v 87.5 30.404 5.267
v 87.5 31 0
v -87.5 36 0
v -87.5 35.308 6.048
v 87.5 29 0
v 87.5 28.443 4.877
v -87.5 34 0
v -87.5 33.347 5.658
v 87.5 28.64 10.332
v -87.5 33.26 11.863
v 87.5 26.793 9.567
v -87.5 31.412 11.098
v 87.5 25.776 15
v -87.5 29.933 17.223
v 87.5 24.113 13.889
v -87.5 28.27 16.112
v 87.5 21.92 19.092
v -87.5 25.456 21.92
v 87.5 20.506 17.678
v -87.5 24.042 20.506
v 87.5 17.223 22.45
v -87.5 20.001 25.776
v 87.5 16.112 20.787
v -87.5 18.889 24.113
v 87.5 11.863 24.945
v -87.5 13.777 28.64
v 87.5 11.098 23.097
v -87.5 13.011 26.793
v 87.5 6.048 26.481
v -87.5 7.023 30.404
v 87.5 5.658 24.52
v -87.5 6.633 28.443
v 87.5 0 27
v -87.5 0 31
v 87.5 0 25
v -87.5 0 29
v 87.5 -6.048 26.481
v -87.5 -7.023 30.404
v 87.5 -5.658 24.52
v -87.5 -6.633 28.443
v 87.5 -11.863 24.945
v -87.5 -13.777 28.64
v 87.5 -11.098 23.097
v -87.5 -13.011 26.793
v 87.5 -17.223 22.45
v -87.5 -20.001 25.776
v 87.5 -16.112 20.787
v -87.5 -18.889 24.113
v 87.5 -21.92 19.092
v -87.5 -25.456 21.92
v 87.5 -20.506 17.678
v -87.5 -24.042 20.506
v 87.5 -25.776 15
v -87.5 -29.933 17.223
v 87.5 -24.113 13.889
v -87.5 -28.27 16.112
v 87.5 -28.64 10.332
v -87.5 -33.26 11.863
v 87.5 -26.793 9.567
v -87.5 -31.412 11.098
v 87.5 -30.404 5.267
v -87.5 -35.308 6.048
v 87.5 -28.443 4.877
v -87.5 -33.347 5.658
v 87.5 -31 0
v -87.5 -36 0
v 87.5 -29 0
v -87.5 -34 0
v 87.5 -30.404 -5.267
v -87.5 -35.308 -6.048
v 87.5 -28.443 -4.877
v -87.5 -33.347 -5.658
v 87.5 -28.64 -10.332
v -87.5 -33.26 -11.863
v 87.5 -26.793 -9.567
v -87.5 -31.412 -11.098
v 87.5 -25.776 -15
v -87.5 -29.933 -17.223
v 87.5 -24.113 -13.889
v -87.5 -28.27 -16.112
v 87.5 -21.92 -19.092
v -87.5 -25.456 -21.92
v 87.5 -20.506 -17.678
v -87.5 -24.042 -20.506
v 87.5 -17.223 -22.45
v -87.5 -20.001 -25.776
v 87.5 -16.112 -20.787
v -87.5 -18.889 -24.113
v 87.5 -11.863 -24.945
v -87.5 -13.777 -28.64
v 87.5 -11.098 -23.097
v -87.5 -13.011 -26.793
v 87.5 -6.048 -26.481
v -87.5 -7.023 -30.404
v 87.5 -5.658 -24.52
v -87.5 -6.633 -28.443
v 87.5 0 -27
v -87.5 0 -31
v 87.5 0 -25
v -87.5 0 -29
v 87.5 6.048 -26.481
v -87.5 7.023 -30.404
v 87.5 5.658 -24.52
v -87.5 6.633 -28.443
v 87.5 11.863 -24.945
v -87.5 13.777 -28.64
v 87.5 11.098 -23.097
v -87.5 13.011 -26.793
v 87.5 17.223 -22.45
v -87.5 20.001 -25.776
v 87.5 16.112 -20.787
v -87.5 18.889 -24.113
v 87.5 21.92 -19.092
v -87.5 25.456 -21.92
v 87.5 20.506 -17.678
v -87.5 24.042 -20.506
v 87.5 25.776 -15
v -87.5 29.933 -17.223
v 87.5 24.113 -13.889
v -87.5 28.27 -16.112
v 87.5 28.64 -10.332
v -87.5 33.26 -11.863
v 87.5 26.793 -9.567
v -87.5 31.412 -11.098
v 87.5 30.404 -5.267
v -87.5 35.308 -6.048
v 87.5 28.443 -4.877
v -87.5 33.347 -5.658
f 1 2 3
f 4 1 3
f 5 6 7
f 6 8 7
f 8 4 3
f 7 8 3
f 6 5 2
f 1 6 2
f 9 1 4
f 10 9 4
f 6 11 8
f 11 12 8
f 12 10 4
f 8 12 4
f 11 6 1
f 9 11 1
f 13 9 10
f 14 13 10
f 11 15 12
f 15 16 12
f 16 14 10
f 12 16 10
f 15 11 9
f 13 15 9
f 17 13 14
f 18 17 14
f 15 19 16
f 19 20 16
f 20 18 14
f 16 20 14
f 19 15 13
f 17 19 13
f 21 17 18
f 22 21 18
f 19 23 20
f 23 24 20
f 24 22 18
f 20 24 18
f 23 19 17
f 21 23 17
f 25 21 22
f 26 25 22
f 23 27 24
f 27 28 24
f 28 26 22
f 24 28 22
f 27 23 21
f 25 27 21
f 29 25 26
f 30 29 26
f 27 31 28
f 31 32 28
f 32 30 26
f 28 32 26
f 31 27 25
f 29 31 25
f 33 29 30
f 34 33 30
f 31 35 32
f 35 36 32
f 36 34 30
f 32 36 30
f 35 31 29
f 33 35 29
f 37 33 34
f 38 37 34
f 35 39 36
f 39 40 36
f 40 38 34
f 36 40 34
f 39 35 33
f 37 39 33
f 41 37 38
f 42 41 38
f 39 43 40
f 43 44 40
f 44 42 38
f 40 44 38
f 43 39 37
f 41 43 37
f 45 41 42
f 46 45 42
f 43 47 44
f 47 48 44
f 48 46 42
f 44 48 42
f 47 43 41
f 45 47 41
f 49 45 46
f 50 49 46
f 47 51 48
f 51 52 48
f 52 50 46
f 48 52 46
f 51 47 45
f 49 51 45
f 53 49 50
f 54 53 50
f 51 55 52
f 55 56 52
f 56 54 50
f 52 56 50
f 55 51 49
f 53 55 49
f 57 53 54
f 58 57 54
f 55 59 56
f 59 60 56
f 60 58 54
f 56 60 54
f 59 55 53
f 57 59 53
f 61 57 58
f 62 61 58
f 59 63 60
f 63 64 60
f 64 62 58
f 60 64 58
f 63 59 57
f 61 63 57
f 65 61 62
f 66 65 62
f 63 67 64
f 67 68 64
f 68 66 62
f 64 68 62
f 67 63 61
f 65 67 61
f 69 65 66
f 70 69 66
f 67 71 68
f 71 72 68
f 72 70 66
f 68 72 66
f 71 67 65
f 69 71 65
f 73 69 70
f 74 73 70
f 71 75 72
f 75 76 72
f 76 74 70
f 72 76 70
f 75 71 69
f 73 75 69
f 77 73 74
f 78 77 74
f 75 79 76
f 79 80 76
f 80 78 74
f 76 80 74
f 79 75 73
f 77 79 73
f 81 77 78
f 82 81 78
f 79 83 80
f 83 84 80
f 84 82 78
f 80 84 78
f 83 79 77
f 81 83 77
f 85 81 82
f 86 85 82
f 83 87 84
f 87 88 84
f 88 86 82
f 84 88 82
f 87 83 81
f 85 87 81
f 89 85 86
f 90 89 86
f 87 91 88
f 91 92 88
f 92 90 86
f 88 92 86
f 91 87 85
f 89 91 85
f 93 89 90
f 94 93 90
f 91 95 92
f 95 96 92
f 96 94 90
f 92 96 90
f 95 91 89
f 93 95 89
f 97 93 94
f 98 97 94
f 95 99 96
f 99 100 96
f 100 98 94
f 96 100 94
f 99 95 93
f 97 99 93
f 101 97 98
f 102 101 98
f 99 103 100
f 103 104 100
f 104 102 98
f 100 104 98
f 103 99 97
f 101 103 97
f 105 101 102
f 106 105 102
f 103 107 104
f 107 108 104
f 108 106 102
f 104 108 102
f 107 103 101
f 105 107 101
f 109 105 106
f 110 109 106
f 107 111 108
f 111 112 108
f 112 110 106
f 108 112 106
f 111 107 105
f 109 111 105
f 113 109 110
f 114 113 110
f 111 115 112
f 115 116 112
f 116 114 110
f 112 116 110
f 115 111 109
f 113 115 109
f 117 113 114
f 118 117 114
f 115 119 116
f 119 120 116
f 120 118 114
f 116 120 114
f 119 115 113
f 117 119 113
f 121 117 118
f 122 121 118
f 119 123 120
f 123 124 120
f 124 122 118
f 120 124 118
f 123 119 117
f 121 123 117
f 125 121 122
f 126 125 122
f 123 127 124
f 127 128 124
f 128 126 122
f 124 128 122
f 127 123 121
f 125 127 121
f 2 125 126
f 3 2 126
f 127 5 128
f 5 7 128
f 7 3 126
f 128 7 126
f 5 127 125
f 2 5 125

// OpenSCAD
polyhedron(points=[[-87.5, 36.0, 0.0], [-87.5, 35.30827, 6.0478], [-87.5, 33.259663, 11.863186], [-87.5, 29.932906, 17.222677], [-87.5, 25.455844, 21.92031], [-87.5, 20.000528, 25.775558], [-87.5, 13.776604, 28.640266], [-87.5, 7.023252, 30.404344], [-87.5, 0.0, 31.0], [-87.5, -7.023252, 30.404344], [-87.5, -13.776604, 28.640266], [-87.5, -20.000528, 25.775558], [-87.5, -25.455844, 21.92031], [-87.5, -29.932906, 17.222677], [-87.5, -33.259663, 11.863186], [-87.5, -35.30827, 6.0478], [-87.5, -36.0, 0.0], [-87.5, -35.30827, -6.0478], [-87.5, -33.259663, -11.863186], [-87.5, -29.932906, -17.222677], [-87.5, -25.455844, -21.92031], [-87.5, -20.000528, -25.775558], [-87.5, -13.776604, -28.640266], [-87.5, -7.023252, -30.404344], [-87.5, -0.0, -31.0], [-87.5, 7.023252, -30.404344], [-87.5, 13.776604, -28.640266], [-87.5, 20.000528, -25.775558], [-87.5, 25.455844, -21.92031], [-87.5, 29.932906, -17.222677], [-87.5, 33.259663, -11.863186], [-87.5, 35.30827, -6.0478], [-87.5, 34.0, 0.0], [-87.5, 33.3467, 5.657619], [-87.5, 31.411904, 11.09782], [-87.5, 28.269967, 16.111537], [-87.5, 24.041631, 20.506097], [-87.5, 18.889388, 24.112619], [-87.5, 13.011237, 26.792506], [-87.5, 6.633071, 28.442773], [-87.5, 0.0, 29.0], [-87.5, -6.633071, 28.442773], [-87.5, -13.011237, 26.792506], [-87.5, -18.889388, 24.112619], [-87.5, -24.041631, 20.506097], [-87.5, -28.269967, 16.111537], [-87.5, -31.411904, 11.09782], [-87.5, -33.3467, 5.657619], [-87.5, -34.0, 0.0], [-87.5, -33.3467, -5.657619], [-87.5, -31.411904, -11.09782], [-87.5, -28.269967, -16.111537], [-87.5, -24.041631, -20.506097], [-87.5, -18.889388, -24.112619], [-87.5, -13.011237, -26.792506], [-87.5, -6.633071, -28.442773], [-87.5, -0.0, -29.0], [-87.5, 6.633071, -28.442773], [-87.5, 13.011237, -26.792506], [-87.5, 18.889388, -24.112619], [-87.5, 24.041631, -20.506097], [-87.5, 28.269967, -16.111537], [-87.5, 31.411904, -11.09782], [-87.5, 33.3467, -5.657619], [87.5, 31.0, 0.0], [87.5, 30.404344, 5.267439], [87.5, 28.640266, 10.332453], [87.5, 25.775558, 15.000396], [87.5, 21.92031, 19.091883], [87.5, 17.222677, 22.44968], [87.5, 11.863186, 24.944747], [87.5, 6.0478, 26.481203], [87.5, 0.0, 27.0], [87.5, -6.0478, 26.481203], [87.5, -11.863186, 24.944747], [87.5, -17.222677, 22.44968], [87.5, -21.92031, 19.091883], [87.5, -25.775558, 15.000396], [87.5, -28.640266, 10.332453], [87.5, -30.404344, 5.267439], [87.5, -31.0, 0.0], [87.5, -30.404344, -5.267439], [87.5, -28.640266, -10.332453], [87.5, -25.775558, -15.000396], [87.5, -21.92031, -19.091883], [87.5, -17.222677, -22.44968], [87.5, -11.863186, -24.944747], [87.5, -6.0478, -26.481203], [87.5, -0.0, -27.0], [87.5, 6.0478, -26.481203], [87.5, 11.863186, -24.944747], [87.5, 17.222677, -22.44968], [87.5, 21.92031, -19.091883], [87.5, 25.775558, -15.000396], [87.5, 28.640266, -10.332453], [87.5, 30.404344, -5.267439], [87.5, 29.0, 0.0], [87.5, 28.442773, 4.877258], [87.5, 26.792506, 9.567086], [87.5, 24.112619, 13.889256], [87.5, 20.506097, 17.67767], [87.5, 16.111537, 20.78674], [87.5, 11.09782, 23.096988], [87.5, 5.657619, 24.519632], [87.5, 0.0, 25.0], [87.5, -5.657619, 24.519632], [87.5, -11.09782, 23.096988], [87.5, -16.111537, 20.78674], [87.5, -20.506097, 17.67767], [87.5, -24.112619, 13.889256], [87.5, -26.792506, 9.567086], [87.5, -28.442773, 4.877258], [87.5, -29.0, 0.0], [87.5, -28.442773, -4.877258], [87.5, -26.792506, -9.567086], [87.5, -24.112619, -13.889256], [87.5, -20.506097, -17.67767], [87.5, -16.111537, -20.78674], [87.5, -11.09782, -23.096988], [87.5, -5.657619, -24.519632], [87.5, -0.0, -25.0], [87.5, 5.657619, -24.519632], [87.5, 11.09782, -23.096988], [87.5, 16.111537, -20.78674], [87.5, 20.506097, -17.67767], [87.5, 24.112619, -13.889256], [87.5, 26.792506, -9.567086], [87.5, 28.442773, -4.877258]], faces=[[0, 64, 65], [0, 65, 1], [32, 97, 96], [32, 33, 97], [0, 1, 33], [0, 33, 32], [64, 96, 97], [64, 97, 65], [1, 65, 66], [1, 66, 2], [33, 98, 97], [33, 34, 98], [1, 2, 34], [1, 34, 33], [65, 97, 98], [65, 98, 66], [2, 66, 67], [2, 67, 3], [34, 99, 98], [34, 35, 99], [2, 3, 35], [2, 35, 34], [66, 98, 99], [66, 99, 67], [3, 67, 68], [3, 68, 4], [35, 100, 99], [35, 36, 100], [3, 4, 36], [3, 36, 35], [67, 99, 100], [67, 100, 68], [4, 68, 69], [4, 69, 5], [36, 101, 100], [36, 37, 101], [4, 5, 37], [4, 37, 36], [68, 100, 101], [68, 101, 69], [5, 69, 70], [5, 70, 6], [37, 102, 101], [37, 38, 102], [5, 6, 38], [5, 38, 37], [69, 101, 102], [69, 102, 70], [6, 70, 71], [6, 71, 7], [38, 103, 102], [38, 39, 103], [6, 7, 39], [6, 39, 38], [70, 102, 103], [70, 103, 71], [7, 71, 72], [7, 72, 8], [39, 104, 103], [39, 40, 104], [7, 8, 40], [7, 40, 39], [71, 103, 104], [71, 104, 72], [8, 72, 73], [8, 73, 9], [40, 105, 104], [40, 41, 105], [8, 9, 41], [8, 41, 40], [72, 104, 105], [72, 105, 73], [9, 73, 74], [9, 74, 10], [41, 106, 105], [41, 42, 106], [9, 10, 42], [9, 42, 41], [73, 105, 106], [73, 106, 74], [10, 74, 75], [10, 75, 11], [42, 107, 106], [42, 43, 107], [10, 11, 43], [10, 43, 42], [74, 106, 107], [74, 107, 75], [11, 75, 76], [11, 76, 12], [43, 108, 107], [43, 44, 108], [11, 12, 44], [11, 44, 43], [75, 107, 108], [75, 108, 76], [12, 76, 77], [12, 77, 13], [44, 109, 108], [44, 45, 109], [12, 13, 45], [12, 45, 44], [76, 108, 109], [76, 109, 77], [13, 77, 78], [13, 78, 14], [45, 110, 109], [45, 46, 110], [13, 14, 46], [13, 46, 45], [77, 109, 110], [77, 110, 78], [14, 78, 79], [14, 79, 15], [46, 111, 110], [46, 47, 111], [14, 15, 47], [14, 47, 46], [78, 110, 111], [78, 111, 79], [15, 79, 80], [15, 80, 16], [47, 112, 111], [47, 48, 112], [15, 16, 48], [15, 48, 47], [79, 111, 112], [79, 112, 80], [16, 80, 81], [16, 81, 17], [48, 113, 112], [48, 49, 113], [16, 17, 49], [16, 49, 48], [80, 112, 113], [80, 113, 81], [17, 81, 82], [17, 82, 18], [49, 114, 113], [49, 50, 114], [17, 18, 50], [17, 50, 49], [81, 113, 114], [81, 114, 82], [18, 82, 83], [18, 83, 19], [50, 115, 114], [50, 51, 115], [18, 19, 51], [18, 51, 50], [82, 114, 115], [82, 115, 83], [19, 83, 84], [19, 84, 20], [51, 116, 115], [51, 52, 116], [19, 20, 52], [19, 52, 51], [83, 115, 116], [83, 116, 84], [20, 84, 85], [20, 85, 21], [52, 117, 116], [52, 53, 117], [20, 21, 53], [20, 53, 52], [84, 116, 117], [84, 117, 85], [21, 85, 86], [21, 86, 22], [53, 118, 117], [53, 54, 118], [21, 22, 54], [21, 54, 53], [85, 117, 118], [85, 118, 86], [22, 86, 87], [22, 87, 23], [54, 119, 118], [54, 55, 119], [22, 23, 55], [22, 55, 54], [86, 118, 119], [86, 119, 87], [23, 87, 88], [23, 88, 24], [55, 120, 119], [55, 56, 120], [23, 24, 56], [23, 56, 55], [87, 119, 120], [87, 120, 88], [24, 88, 89], [24, 89, 25], [56, 121, 120], [56, 57, 121], [24, 25, 57], [24, 57, 56], [88, 120, 121], [88, 121, 89], [25, 89, 90], [25, 90, 26], [57, 122, 121], [57, 58, 122], [25, 26, 58], [25, 58, 57], [89, 121, 122], [89, 122, 90], [26, 90, 91], [26, 91, 27], [58, 123, 122], [58, 59, 123], [26, 27, 59], [26, 59, 58], [90, 122, 123], [90, 123, 91], [27, 91, 92], [27, 92, 28], [59, 124, 123], [59, 60, 124], [27, 28, 60], [27, 60, 59], [91, 123, 124], [91, 124, 92], [28, 92, 93], [28, 93, 29], [60, 125, 124], [60, 61, 125], [28, 29, 61], [28, 61, 60], [92, 124, 125], [92, 125, 93], [29, 93, 94], [29, 94, 30], [61, 126, 125], [61, 62, 126], [29, 30, 62], [29, 62, 61], [93, 125, 126], [93, 126, 94], [30, 94, 95], [30, 95, 31], [62, 127, 126], [62, 63, 127], [30, 31, 63], [30, 63, 62], [94, 126, 127], [94, 127, 95], [31, 95, 64], [31, 64, 0], [63, 96, 127], [63, 32, 96], [31, 0, 32], [31, 32, 63], [95, 127, 96], [95, 96, 64]], convexity=20);
